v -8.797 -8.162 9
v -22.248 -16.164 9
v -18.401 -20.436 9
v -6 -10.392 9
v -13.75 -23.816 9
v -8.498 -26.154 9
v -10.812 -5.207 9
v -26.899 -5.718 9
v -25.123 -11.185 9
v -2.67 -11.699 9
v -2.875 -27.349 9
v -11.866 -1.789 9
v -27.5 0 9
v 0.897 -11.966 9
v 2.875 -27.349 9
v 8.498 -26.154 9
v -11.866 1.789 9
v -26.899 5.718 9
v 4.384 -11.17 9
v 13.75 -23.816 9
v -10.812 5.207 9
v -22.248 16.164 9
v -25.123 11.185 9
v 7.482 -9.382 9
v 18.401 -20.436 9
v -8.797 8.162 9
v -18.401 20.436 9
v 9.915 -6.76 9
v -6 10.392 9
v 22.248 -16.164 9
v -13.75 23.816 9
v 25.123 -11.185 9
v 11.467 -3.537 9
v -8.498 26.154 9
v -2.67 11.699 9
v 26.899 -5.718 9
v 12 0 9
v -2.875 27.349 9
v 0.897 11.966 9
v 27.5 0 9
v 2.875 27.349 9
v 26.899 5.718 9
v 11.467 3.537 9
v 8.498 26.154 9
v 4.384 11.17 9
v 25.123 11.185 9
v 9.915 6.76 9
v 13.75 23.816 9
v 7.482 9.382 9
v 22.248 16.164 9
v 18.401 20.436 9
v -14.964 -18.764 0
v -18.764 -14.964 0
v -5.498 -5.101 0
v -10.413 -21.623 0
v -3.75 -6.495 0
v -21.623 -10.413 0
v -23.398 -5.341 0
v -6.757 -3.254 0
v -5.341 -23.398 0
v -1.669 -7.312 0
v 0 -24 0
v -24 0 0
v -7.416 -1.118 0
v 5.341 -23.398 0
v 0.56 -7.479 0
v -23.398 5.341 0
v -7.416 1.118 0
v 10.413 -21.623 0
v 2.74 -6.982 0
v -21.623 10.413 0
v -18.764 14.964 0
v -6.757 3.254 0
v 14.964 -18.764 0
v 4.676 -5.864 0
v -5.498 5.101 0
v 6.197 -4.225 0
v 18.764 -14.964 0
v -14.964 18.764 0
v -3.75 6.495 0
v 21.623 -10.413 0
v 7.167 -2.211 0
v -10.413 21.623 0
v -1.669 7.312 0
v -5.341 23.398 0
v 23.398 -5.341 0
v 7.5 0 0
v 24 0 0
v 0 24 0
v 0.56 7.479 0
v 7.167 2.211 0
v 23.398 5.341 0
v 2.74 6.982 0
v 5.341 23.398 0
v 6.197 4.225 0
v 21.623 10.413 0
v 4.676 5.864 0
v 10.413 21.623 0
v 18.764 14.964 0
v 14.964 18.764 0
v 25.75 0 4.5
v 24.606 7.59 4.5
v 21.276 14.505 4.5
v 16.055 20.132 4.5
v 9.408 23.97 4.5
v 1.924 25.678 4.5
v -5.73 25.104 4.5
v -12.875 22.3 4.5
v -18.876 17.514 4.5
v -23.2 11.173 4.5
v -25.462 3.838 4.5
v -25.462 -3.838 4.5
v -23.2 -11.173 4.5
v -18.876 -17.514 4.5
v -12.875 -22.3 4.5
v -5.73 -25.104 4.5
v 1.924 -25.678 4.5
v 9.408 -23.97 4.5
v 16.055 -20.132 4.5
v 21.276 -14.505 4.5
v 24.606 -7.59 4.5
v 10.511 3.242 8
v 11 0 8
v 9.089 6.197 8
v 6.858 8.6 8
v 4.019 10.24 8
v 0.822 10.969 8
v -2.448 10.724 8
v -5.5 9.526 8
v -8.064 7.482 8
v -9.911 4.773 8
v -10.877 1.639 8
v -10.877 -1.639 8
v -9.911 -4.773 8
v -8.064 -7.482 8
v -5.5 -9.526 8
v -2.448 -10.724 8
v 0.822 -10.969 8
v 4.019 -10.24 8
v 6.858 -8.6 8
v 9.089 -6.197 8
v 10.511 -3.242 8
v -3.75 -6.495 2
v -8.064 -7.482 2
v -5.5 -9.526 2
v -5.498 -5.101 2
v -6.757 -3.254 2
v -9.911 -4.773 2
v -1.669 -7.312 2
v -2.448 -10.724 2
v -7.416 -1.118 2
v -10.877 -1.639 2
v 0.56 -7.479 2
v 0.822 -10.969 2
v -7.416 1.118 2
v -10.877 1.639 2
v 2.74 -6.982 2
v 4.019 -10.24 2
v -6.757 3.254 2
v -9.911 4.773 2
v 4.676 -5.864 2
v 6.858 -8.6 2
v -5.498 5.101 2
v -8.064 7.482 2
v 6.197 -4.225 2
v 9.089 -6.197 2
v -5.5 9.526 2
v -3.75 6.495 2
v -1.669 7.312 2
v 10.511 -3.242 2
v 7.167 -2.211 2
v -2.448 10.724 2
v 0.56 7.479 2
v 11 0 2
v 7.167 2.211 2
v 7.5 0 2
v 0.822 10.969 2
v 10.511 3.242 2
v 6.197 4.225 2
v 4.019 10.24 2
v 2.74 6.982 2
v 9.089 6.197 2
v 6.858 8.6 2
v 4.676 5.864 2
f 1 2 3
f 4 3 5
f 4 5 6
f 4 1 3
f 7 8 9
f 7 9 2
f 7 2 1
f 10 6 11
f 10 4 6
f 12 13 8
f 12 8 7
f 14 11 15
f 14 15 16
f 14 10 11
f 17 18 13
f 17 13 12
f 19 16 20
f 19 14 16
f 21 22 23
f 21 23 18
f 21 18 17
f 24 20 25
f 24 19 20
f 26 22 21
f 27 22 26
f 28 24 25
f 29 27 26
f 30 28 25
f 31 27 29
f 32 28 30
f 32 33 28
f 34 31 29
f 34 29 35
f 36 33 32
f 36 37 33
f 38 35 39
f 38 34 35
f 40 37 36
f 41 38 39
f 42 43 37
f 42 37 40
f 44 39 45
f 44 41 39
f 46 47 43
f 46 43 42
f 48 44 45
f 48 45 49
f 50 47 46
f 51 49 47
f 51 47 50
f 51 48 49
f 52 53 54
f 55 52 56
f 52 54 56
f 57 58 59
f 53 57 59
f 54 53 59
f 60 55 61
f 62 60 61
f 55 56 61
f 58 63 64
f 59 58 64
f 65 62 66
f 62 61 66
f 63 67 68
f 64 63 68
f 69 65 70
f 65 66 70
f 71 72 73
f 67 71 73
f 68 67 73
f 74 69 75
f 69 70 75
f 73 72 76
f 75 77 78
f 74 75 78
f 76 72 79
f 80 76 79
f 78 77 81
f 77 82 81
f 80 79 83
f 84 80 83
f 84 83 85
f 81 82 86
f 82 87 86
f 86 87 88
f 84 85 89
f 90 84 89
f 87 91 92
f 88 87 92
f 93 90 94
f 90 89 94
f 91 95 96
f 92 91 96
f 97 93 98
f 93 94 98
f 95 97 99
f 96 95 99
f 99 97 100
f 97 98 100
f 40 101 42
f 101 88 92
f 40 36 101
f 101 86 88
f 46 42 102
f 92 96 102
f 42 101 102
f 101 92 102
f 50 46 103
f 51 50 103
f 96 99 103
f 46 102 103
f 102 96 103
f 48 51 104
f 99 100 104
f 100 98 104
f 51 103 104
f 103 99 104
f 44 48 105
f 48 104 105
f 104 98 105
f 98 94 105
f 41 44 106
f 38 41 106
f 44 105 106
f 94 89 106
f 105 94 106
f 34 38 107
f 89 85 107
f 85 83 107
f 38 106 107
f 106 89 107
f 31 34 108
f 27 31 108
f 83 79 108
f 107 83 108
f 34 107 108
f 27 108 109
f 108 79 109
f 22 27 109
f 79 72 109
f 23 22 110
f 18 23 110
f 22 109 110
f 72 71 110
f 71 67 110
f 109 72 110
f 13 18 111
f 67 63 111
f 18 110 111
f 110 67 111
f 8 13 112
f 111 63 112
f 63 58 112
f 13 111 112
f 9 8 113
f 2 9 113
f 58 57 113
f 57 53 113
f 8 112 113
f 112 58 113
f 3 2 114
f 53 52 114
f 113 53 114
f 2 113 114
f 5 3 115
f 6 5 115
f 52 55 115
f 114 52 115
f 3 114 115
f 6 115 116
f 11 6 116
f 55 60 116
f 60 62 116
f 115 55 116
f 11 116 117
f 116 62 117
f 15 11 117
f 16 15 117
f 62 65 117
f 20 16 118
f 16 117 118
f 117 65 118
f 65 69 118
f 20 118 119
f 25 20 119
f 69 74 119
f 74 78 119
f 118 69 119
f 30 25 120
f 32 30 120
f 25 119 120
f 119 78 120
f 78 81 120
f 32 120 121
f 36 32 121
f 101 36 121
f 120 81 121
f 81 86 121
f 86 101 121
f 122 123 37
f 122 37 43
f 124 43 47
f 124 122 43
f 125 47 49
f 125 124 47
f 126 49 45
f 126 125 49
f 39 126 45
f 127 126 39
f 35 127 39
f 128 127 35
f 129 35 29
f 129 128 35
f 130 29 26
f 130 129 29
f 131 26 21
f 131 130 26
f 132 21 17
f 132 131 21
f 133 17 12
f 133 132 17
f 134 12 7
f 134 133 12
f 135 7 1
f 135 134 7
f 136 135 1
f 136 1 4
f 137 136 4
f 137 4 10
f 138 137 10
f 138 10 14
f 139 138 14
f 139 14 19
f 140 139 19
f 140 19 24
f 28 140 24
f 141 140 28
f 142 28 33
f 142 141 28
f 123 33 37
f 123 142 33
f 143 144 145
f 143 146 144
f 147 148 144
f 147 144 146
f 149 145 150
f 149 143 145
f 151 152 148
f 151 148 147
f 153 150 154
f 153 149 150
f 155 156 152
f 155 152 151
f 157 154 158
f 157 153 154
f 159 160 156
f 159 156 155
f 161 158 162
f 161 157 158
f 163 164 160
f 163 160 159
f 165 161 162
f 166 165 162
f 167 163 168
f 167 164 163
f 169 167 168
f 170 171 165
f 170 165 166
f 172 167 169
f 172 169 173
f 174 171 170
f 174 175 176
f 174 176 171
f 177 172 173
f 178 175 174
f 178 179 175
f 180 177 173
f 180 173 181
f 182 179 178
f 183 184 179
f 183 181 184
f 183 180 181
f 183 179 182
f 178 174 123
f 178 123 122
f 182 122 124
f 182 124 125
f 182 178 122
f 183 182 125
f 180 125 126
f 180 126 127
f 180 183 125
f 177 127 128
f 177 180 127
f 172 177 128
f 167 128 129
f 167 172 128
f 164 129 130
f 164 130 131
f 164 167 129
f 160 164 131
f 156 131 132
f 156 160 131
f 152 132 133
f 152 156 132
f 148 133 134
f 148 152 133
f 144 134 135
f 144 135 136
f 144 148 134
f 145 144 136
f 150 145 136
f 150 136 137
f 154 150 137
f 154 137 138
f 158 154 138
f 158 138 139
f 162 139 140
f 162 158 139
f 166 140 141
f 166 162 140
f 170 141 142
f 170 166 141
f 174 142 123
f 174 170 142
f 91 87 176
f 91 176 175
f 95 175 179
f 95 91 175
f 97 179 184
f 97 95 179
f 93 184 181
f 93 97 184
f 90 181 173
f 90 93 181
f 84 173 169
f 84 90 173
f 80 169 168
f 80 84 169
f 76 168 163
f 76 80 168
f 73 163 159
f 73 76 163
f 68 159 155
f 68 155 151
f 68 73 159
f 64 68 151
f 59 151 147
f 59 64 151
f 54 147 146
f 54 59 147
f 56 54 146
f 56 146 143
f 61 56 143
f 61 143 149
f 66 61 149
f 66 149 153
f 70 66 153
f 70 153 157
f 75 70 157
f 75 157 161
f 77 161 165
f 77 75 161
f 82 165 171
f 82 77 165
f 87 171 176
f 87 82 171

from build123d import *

# Parameters (mm, degrees)
F0_R     = 27.5
F0_R_2   = 7.5
F1_DEPTH = 2
F2_R     = 27.5
F2_R_2   = 11
F3_DEPTH = 7
F4_SIZE2 = 3.49999
F4_SIZE  = 8.99999
F5_SIZE  = 1


# Not quite as in the source:
# - a fillet or chamfer is up to 0.001 mm smaller than in the source, because OpenCascade refuses the exact size


with BuildPart() as f1:
    # F0 (on Top) → F1 (new body)
    with BuildSketch(Plane.XY):
        Circle(F0_R)
        Circle(F0_R_2, mode=Mode.SUBTRACT)
    extrude(amount=F1_DEPTH)

    # F2 (on face) → F3 (join)
    with BuildSketch(Plane.XY.offset(2)):
        Circle(F2_R)
        Circle(F2_R_2, mode=Mode.SUBTRACT)
    extrude(amount=F3_DEPTH)

    # F4 (size 9 and 3.5 in the source; OpenCascade refuses exactly that, so slightly less here)
    f4_edges = [f1.edges().sort_by_distance(p)[0] for p in [
        (-27.5, 0, 0),
    ]]
    f4_side = f1.faces().sort_by_distance((-27.5, 0, 4.5))[0]
    chamfer(f4_edges, length=F4_SIZE, length2=F4_SIZE2, reference=f4_side)

    # F5
    f5_edges = [f1.edges().sort_by_distance(p)[0] for p in [
        (-11, 0, 9),
    ]]
    chamfer(f5_edges, length=F5_SIZE)


solid = f1.part
